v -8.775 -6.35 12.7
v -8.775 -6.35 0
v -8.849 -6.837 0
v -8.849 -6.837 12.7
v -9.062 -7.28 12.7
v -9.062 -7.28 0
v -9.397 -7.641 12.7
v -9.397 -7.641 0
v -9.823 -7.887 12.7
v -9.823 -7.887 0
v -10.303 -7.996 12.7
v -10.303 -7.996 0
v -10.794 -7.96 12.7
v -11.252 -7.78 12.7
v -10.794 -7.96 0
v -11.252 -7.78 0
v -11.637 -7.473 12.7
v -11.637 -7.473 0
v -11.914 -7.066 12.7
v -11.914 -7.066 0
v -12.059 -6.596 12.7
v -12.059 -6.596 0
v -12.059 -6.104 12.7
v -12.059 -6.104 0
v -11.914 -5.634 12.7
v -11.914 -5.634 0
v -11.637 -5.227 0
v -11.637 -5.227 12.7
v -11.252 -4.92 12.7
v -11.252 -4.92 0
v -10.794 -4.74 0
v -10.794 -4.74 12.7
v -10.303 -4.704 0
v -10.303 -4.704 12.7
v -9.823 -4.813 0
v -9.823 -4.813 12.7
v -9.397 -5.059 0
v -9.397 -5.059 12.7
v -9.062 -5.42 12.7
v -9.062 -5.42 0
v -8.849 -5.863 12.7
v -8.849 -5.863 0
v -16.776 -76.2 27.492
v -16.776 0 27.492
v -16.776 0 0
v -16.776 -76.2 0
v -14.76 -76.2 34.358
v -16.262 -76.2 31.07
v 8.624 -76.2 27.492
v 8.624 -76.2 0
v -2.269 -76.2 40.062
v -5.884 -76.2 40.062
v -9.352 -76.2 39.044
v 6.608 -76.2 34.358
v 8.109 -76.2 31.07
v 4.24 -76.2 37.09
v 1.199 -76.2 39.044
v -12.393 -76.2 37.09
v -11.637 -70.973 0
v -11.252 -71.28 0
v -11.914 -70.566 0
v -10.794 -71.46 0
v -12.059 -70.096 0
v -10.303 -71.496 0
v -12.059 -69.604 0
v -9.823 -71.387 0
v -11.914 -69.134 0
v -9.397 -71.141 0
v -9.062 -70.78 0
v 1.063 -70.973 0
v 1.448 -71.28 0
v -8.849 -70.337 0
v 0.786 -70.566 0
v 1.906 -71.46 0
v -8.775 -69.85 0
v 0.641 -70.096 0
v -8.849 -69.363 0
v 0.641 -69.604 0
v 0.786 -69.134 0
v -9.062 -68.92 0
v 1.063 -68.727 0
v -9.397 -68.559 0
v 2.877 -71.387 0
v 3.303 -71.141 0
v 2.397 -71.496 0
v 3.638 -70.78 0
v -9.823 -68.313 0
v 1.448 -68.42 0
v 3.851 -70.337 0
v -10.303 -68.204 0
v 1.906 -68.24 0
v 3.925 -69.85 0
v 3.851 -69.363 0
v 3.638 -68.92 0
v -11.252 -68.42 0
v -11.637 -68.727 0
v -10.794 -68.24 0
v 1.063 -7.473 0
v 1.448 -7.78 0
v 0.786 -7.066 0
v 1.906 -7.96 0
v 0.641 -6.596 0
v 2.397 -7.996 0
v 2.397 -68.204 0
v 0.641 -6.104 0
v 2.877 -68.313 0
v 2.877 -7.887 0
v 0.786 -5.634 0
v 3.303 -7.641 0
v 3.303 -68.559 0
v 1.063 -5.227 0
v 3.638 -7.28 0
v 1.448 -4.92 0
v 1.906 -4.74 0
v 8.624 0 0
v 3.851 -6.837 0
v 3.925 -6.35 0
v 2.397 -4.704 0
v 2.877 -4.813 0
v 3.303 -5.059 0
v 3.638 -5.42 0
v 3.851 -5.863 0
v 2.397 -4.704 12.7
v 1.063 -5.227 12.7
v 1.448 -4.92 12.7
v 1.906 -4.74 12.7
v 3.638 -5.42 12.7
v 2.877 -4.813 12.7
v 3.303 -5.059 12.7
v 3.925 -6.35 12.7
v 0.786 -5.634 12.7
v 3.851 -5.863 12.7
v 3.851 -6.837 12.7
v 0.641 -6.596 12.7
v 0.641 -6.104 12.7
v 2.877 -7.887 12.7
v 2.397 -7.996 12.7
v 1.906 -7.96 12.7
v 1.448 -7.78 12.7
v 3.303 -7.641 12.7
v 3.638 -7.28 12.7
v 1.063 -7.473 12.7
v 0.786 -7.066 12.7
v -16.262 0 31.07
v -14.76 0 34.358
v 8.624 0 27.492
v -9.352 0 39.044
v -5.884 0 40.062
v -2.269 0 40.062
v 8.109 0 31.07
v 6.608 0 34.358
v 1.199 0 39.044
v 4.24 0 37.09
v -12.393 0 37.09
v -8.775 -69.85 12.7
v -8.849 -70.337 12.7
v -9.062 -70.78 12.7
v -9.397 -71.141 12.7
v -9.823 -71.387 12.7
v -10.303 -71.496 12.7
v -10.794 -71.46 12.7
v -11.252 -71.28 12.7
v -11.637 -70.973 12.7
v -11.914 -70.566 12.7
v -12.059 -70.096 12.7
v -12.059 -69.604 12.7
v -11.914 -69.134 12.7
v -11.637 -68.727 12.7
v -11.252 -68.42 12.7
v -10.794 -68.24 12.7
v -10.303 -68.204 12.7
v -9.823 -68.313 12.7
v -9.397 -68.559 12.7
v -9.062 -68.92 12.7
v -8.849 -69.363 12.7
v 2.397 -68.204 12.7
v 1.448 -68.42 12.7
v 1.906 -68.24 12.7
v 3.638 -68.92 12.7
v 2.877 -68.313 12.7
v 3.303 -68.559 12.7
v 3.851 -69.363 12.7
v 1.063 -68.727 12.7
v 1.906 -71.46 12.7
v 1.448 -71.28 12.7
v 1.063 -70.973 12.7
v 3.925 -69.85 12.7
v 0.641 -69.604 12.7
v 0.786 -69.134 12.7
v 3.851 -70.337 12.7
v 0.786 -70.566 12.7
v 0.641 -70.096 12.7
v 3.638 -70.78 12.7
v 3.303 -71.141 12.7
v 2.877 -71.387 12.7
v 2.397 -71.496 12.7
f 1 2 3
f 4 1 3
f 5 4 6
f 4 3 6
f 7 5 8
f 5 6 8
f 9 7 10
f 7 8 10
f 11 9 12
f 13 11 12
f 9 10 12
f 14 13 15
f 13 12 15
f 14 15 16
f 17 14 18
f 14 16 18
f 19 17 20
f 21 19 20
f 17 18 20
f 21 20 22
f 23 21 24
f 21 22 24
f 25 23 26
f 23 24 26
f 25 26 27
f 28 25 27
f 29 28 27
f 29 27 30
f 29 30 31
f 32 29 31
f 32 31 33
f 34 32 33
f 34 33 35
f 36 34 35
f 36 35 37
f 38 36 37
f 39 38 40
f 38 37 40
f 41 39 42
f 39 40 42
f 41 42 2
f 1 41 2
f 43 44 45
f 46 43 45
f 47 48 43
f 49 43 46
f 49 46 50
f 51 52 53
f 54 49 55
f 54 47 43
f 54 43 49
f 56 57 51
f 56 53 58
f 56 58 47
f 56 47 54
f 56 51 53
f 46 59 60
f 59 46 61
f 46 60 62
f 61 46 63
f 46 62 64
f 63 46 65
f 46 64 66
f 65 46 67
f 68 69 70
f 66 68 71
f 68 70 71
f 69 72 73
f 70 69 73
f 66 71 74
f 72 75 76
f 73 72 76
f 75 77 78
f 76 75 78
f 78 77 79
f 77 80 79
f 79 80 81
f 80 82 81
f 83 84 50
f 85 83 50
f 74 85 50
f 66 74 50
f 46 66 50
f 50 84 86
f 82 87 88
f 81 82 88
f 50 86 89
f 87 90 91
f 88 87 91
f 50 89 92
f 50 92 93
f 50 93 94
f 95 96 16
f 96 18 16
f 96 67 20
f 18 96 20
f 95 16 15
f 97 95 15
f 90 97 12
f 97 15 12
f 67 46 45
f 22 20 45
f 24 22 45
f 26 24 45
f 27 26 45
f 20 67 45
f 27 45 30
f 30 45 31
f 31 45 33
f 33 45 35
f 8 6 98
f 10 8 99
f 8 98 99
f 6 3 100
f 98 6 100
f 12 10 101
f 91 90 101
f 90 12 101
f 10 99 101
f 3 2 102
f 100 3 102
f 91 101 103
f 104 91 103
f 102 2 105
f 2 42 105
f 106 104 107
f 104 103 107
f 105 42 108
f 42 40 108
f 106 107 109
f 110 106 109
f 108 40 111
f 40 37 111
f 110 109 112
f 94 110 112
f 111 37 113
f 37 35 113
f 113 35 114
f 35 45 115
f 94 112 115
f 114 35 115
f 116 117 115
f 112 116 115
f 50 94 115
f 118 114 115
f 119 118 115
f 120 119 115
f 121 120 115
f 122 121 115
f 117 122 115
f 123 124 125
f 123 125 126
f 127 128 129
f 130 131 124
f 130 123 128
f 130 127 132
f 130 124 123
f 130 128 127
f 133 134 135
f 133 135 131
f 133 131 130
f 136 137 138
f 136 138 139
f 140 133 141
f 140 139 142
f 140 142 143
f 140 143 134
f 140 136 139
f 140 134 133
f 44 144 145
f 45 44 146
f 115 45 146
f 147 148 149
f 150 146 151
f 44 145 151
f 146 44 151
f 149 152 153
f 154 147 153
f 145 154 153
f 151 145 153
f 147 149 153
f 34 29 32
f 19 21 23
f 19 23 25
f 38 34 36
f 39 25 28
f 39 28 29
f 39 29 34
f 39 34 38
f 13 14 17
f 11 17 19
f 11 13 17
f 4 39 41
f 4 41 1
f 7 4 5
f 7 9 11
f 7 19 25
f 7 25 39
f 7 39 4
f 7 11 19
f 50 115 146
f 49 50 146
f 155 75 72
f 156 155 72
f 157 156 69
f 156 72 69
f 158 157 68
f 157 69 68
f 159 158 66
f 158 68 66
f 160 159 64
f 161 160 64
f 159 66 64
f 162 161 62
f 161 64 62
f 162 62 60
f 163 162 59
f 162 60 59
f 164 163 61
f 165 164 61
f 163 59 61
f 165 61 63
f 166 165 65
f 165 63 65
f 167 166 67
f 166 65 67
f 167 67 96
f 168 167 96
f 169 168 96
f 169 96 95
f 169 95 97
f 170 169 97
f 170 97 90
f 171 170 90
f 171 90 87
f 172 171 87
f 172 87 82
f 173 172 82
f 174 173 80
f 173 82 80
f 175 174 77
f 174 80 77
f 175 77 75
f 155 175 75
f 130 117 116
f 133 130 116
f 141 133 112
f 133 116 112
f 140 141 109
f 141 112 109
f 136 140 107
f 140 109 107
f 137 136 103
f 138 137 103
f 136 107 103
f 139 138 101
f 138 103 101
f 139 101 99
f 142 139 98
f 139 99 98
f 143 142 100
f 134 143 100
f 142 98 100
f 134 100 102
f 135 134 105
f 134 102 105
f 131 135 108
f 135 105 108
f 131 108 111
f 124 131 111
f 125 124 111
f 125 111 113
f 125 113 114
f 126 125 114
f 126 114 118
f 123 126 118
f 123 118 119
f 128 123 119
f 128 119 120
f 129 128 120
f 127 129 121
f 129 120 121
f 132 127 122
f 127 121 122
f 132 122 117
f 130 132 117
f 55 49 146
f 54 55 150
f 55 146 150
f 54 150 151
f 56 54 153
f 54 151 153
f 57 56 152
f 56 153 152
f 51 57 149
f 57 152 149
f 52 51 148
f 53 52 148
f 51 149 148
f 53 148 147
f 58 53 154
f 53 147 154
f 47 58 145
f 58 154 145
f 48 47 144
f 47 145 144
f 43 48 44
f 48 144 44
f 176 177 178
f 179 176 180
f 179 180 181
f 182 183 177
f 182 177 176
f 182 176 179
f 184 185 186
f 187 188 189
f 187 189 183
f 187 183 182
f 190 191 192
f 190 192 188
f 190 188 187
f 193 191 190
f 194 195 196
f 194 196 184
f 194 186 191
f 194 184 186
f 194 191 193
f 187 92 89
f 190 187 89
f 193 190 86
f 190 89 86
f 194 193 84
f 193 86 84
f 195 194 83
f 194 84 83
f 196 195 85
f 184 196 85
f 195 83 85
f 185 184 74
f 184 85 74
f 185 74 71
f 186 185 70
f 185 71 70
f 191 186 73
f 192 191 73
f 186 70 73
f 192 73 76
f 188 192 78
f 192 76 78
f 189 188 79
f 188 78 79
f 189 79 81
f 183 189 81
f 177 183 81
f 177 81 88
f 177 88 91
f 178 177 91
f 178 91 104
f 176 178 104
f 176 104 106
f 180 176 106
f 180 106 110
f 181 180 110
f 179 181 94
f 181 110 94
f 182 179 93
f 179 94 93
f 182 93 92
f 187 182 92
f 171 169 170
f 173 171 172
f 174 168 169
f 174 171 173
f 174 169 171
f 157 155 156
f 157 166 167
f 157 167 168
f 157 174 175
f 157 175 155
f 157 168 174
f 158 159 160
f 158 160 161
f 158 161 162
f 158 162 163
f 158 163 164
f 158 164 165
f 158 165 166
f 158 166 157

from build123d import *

# Parameters (mm, degrees)
F0_R     = 9.525
F1_DEPTH = 76.2
F2_R     = 1.651
F3_DEPTH = 12.7


with BuildPart() as f1:
    # F0 (on Front) → F1 (new body)
    with BuildSketch(Plane.XZ):
        with BuildLine():
            Line((-16.7763393044, 27.4915862828), (-16.7763393044, 9.313e-07))
            Line((-16.7763393044, 9.313e-07), (8.6236606956, 9.313e-07))
            Line((8.6236606956, 9.313e-07), (8.6236606956, 27.4915862828))
            ThreePointArc((8.6236606956, 27.4915862828), (-4.0763393044, 40.1915862828), (-16.7763393044, 27.4915862828))
        make_face()
        with Locations((-4.0763393044, 27.4915862828)):
            Circle(F0_R, mode=Mode.SUBTRACT)
        with Locations((-4.0763393044, 27.4915862828)):
            Circle(F0_R)
    extrude(amount=F1_DEPTH)

    # F2 (on face) → F3 (cut)
    with BuildSketch(Plane(origin=(0, 0, 9.313e-07), x_dir=(1, 0, 0), z_dir=(0, 0, -1))):
        with Locations((-10.4263393044, 6.35)):
            Circle(F2_R)
        with Locations((-10.4263393044, 69.85)):
            Circle(F2_R)
        with Locations((2.2736606956, 6.35)):
            Circle(F2_R)
        with Locations((2.2736606956, 69.85)):
            Circle(F2_R)
    extrude(amount=-F3_DEPTH, mode=Mode.SUBTRACT)


solid = f1.part
